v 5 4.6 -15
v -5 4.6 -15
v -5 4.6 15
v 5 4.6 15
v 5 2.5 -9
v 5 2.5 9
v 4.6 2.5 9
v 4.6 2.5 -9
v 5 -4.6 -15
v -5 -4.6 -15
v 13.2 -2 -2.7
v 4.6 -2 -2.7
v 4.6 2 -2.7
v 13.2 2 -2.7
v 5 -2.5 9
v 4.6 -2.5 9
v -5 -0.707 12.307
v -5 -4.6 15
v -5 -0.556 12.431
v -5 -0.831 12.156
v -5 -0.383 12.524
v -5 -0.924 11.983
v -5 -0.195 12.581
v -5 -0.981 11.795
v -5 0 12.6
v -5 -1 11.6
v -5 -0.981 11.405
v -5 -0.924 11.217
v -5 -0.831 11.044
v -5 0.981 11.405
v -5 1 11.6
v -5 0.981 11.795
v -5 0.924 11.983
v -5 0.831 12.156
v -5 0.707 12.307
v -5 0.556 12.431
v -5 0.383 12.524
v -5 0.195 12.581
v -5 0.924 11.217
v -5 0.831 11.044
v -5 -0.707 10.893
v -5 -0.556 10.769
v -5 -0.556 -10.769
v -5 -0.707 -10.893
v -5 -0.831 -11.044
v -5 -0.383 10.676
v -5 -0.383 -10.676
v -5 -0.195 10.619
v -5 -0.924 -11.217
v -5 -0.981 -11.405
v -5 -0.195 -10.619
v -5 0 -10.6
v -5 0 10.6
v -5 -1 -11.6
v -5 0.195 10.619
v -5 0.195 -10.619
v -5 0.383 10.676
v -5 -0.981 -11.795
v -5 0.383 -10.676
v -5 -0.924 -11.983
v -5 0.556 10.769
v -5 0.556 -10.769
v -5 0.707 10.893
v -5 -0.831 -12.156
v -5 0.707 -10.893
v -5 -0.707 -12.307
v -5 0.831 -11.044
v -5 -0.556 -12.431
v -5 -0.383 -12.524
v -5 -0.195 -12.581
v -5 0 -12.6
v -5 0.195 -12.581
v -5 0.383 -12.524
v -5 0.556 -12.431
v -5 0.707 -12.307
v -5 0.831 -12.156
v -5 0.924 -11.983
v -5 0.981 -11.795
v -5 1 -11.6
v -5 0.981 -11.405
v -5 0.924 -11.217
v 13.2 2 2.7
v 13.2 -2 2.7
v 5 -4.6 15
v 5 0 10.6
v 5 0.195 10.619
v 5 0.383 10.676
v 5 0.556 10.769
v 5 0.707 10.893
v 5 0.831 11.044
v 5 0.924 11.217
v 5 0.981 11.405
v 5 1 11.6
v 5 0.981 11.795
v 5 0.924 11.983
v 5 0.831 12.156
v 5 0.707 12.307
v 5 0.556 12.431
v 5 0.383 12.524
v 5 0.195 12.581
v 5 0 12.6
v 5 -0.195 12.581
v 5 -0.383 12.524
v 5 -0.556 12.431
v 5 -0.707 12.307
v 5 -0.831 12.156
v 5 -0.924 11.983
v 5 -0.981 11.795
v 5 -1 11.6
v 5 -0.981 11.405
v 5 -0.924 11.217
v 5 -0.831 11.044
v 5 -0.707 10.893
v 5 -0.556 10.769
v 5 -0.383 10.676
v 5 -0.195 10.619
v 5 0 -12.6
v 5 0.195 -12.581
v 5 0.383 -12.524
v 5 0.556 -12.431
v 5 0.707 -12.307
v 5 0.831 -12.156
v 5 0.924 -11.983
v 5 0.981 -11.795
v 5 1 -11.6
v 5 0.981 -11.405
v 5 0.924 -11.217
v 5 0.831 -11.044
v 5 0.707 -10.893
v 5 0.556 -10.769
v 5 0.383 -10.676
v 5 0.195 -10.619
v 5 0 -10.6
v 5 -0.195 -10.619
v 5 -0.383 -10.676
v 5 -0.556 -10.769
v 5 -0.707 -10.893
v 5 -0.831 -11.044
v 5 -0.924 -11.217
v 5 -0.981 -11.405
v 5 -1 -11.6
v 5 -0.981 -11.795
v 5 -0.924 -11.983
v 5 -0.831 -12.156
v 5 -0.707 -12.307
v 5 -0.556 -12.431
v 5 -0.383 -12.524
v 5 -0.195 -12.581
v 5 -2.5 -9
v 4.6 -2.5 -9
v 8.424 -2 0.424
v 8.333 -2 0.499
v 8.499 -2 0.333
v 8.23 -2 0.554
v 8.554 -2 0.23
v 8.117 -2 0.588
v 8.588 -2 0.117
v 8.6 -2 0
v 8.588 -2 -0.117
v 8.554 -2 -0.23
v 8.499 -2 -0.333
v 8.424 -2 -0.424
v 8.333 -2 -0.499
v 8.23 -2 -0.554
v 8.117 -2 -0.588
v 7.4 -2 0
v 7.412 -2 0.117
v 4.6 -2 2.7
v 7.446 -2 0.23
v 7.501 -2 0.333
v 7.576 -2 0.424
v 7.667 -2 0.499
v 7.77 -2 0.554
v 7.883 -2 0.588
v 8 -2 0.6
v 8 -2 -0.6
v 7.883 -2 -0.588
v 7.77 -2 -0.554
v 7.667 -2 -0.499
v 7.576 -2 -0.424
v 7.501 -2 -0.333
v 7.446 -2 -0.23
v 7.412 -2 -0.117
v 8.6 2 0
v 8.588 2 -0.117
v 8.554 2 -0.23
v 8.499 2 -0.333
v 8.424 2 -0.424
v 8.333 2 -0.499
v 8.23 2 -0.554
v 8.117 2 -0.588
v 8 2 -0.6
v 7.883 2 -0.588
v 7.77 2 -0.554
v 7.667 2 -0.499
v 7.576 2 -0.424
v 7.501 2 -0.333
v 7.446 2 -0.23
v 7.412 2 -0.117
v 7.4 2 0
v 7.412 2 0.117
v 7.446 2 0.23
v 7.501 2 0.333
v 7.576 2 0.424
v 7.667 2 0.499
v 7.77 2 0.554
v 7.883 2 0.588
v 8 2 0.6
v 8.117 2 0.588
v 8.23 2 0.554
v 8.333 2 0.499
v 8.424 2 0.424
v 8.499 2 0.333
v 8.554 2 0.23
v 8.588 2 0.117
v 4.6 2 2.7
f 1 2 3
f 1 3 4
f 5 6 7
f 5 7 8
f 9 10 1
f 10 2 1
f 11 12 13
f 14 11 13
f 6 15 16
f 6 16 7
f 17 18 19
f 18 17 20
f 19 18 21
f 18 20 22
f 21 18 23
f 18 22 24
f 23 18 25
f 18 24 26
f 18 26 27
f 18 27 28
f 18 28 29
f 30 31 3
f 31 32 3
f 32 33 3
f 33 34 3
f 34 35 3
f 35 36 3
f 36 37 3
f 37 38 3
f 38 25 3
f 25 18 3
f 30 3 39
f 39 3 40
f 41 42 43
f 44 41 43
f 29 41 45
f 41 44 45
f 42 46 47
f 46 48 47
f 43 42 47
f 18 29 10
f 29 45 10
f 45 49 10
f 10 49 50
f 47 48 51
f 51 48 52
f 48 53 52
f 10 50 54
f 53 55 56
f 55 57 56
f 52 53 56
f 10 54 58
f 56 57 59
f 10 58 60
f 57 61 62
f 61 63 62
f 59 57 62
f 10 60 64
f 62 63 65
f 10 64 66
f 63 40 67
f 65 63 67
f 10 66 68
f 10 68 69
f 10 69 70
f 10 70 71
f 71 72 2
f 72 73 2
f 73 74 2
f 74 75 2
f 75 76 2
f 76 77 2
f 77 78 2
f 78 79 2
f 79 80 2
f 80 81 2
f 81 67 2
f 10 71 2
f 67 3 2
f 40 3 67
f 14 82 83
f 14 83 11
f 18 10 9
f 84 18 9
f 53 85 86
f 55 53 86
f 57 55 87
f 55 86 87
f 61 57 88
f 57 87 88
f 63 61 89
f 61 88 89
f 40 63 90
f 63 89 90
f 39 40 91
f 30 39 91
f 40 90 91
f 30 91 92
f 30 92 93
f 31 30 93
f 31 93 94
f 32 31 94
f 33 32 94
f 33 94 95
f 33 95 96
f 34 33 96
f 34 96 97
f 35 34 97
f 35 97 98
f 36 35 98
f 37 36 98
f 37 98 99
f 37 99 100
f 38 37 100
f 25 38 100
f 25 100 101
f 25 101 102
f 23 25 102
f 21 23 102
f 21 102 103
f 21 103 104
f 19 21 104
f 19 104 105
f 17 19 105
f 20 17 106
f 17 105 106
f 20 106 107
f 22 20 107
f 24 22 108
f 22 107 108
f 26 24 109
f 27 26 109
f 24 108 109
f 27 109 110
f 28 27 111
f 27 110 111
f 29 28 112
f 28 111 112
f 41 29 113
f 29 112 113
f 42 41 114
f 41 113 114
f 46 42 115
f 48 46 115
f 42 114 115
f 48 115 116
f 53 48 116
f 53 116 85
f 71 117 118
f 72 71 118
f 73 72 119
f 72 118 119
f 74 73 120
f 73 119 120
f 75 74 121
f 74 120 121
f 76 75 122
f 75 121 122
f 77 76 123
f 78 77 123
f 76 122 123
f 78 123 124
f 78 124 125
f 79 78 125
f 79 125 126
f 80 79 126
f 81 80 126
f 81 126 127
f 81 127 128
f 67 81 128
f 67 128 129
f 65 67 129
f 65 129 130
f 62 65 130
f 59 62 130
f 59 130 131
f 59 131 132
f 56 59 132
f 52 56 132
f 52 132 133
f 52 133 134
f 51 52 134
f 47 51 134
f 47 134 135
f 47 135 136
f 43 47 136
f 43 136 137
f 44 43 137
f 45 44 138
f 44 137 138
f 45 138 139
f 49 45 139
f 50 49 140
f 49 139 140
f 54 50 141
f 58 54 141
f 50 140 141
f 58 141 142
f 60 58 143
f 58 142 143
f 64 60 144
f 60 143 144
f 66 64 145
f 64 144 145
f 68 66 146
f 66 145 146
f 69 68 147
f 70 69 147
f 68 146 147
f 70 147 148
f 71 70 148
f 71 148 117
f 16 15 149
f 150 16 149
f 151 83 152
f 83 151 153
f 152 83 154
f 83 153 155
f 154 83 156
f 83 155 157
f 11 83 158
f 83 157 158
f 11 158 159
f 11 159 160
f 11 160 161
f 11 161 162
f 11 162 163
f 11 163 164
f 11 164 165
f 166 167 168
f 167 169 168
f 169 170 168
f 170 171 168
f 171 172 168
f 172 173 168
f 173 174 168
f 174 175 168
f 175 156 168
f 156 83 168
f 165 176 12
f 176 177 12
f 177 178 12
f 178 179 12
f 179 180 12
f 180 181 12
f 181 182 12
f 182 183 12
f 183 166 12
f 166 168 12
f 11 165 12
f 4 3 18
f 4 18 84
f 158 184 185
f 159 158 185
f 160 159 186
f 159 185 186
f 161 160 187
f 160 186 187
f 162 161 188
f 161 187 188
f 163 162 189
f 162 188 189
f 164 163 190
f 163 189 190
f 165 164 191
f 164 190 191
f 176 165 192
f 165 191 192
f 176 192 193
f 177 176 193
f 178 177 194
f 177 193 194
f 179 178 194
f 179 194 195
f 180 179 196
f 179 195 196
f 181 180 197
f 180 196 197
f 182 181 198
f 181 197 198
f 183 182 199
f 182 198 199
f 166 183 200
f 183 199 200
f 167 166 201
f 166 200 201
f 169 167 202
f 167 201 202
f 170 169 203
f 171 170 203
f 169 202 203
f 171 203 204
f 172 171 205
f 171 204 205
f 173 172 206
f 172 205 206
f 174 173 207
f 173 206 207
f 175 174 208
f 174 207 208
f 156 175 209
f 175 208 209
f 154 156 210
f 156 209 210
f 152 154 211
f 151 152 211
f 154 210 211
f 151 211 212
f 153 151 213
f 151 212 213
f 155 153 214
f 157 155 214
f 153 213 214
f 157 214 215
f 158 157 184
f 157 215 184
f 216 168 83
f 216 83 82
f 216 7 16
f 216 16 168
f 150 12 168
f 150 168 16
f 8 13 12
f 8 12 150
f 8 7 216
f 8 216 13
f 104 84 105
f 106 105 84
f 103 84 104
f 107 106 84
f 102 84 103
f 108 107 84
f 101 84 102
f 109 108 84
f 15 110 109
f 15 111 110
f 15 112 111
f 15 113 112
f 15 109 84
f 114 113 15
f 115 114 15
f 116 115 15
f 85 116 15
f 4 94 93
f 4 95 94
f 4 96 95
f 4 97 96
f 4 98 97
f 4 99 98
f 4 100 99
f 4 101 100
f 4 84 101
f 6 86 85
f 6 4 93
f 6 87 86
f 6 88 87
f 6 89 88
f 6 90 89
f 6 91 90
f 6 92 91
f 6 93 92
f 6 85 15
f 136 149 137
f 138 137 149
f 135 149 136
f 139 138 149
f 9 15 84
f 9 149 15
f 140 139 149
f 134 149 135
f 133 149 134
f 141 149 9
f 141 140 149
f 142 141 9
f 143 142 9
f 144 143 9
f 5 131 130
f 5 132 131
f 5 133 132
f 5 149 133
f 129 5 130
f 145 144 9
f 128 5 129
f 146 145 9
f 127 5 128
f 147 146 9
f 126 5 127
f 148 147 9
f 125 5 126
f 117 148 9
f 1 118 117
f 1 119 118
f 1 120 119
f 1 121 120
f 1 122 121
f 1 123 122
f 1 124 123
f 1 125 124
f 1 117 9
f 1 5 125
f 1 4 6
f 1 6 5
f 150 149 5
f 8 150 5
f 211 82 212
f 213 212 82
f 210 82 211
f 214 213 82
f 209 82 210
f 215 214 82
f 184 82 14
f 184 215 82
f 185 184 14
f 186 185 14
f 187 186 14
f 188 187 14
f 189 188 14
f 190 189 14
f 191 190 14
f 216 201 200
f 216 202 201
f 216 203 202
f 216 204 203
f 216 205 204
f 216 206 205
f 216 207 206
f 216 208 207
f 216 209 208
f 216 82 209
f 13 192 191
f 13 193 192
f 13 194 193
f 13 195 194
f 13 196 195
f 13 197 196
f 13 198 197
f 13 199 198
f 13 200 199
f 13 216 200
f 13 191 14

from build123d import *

# Parameters (mm, degrees)
SKETCH_1_W          = 10
SKETCH_1_H          = 30
EXTRUDE_1_DEPTH     = 4.6
SKETCH_2_W          = 18
SKETCH_2_H          = 5
CUT_EXTRUDE_1_DEPTH = 0.4
SKETCH_3_W          = 5.4
SKETCH_3_H          = 4
EXTRUDE_2_DEPTH     = 8.6
SKETCH_4_R          = 0.6
CUT_EXTRUDE_2_DEPTH = 4
SKETCH_5_R          = 1
CUT_EXTRUDE_3_DEPTH = 11


with BuildPart() as part:
    # 草图1 → 凸台-拉伸1 (new body, symmetric)
    with BuildSketch(Plane(origin=(0, 0, 0), x_dir=(1, 0, 0), z_dir=(0, 1, 0))):
        Rectangle(SKETCH_1_W, SKETCH_1_H)
    extrude(amount=EXTRUDE_1_DEPTH, both=True)

    # 草图2 → 切除-拉伸1 (cut)
    with BuildSketch(Plane(origin=(5, 0, 0), x_dir=(0, 0, -1), z_dir=(1, 0, 0))):
        Rectangle(SKETCH_2_W, SKETCH_2_H)
    extrude(amount=-CUT_EXTRUDE_1_DEPTH, mode=Mode.SUBTRACT)

    # 草图3 → 凸台-拉伸2 (add)
    with BuildSketch(Plane(origin=(4.6, 0, 0), x_dir=(0, 0, -1), z_dir=(1, 0, 0))):
        Rectangle(SKETCH_3_W, SKETCH_3_H)
    extrude(amount=EXTRUDE_2_DEPTH)

    # 草图4 → 切除-拉伸2 (cut)
    with BuildSketch(Plane(origin=(0, 2, 0), x_dir=(1, 0, 0), z_dir=(0, 1, 0))):
        with Locations((8, 0)):
            Circle(SKETCH_4_R)
    extrude(amount=-CUT_EXTRUDE_2_DEPTH, mode=Mode.SUBTRACT)

    # 草图5 → 切除-拉伸3 (cut, through all)
    with BuildSketch(Plane(origin=(5, 0, 0), x_dir=(0, 0, -1), z_dir=(1, 0, 0))):
        with Locations((11.6, 0)):
            Circle(SKETCH_5_R)
        with Locations((-11.6, 0)):
            Circle(SKETCH_5_R)
    extrude(amount=-CUT_EXTRUDE_3_DEPTH, mode=Mode.SUBTRACT)


solid = part.part
